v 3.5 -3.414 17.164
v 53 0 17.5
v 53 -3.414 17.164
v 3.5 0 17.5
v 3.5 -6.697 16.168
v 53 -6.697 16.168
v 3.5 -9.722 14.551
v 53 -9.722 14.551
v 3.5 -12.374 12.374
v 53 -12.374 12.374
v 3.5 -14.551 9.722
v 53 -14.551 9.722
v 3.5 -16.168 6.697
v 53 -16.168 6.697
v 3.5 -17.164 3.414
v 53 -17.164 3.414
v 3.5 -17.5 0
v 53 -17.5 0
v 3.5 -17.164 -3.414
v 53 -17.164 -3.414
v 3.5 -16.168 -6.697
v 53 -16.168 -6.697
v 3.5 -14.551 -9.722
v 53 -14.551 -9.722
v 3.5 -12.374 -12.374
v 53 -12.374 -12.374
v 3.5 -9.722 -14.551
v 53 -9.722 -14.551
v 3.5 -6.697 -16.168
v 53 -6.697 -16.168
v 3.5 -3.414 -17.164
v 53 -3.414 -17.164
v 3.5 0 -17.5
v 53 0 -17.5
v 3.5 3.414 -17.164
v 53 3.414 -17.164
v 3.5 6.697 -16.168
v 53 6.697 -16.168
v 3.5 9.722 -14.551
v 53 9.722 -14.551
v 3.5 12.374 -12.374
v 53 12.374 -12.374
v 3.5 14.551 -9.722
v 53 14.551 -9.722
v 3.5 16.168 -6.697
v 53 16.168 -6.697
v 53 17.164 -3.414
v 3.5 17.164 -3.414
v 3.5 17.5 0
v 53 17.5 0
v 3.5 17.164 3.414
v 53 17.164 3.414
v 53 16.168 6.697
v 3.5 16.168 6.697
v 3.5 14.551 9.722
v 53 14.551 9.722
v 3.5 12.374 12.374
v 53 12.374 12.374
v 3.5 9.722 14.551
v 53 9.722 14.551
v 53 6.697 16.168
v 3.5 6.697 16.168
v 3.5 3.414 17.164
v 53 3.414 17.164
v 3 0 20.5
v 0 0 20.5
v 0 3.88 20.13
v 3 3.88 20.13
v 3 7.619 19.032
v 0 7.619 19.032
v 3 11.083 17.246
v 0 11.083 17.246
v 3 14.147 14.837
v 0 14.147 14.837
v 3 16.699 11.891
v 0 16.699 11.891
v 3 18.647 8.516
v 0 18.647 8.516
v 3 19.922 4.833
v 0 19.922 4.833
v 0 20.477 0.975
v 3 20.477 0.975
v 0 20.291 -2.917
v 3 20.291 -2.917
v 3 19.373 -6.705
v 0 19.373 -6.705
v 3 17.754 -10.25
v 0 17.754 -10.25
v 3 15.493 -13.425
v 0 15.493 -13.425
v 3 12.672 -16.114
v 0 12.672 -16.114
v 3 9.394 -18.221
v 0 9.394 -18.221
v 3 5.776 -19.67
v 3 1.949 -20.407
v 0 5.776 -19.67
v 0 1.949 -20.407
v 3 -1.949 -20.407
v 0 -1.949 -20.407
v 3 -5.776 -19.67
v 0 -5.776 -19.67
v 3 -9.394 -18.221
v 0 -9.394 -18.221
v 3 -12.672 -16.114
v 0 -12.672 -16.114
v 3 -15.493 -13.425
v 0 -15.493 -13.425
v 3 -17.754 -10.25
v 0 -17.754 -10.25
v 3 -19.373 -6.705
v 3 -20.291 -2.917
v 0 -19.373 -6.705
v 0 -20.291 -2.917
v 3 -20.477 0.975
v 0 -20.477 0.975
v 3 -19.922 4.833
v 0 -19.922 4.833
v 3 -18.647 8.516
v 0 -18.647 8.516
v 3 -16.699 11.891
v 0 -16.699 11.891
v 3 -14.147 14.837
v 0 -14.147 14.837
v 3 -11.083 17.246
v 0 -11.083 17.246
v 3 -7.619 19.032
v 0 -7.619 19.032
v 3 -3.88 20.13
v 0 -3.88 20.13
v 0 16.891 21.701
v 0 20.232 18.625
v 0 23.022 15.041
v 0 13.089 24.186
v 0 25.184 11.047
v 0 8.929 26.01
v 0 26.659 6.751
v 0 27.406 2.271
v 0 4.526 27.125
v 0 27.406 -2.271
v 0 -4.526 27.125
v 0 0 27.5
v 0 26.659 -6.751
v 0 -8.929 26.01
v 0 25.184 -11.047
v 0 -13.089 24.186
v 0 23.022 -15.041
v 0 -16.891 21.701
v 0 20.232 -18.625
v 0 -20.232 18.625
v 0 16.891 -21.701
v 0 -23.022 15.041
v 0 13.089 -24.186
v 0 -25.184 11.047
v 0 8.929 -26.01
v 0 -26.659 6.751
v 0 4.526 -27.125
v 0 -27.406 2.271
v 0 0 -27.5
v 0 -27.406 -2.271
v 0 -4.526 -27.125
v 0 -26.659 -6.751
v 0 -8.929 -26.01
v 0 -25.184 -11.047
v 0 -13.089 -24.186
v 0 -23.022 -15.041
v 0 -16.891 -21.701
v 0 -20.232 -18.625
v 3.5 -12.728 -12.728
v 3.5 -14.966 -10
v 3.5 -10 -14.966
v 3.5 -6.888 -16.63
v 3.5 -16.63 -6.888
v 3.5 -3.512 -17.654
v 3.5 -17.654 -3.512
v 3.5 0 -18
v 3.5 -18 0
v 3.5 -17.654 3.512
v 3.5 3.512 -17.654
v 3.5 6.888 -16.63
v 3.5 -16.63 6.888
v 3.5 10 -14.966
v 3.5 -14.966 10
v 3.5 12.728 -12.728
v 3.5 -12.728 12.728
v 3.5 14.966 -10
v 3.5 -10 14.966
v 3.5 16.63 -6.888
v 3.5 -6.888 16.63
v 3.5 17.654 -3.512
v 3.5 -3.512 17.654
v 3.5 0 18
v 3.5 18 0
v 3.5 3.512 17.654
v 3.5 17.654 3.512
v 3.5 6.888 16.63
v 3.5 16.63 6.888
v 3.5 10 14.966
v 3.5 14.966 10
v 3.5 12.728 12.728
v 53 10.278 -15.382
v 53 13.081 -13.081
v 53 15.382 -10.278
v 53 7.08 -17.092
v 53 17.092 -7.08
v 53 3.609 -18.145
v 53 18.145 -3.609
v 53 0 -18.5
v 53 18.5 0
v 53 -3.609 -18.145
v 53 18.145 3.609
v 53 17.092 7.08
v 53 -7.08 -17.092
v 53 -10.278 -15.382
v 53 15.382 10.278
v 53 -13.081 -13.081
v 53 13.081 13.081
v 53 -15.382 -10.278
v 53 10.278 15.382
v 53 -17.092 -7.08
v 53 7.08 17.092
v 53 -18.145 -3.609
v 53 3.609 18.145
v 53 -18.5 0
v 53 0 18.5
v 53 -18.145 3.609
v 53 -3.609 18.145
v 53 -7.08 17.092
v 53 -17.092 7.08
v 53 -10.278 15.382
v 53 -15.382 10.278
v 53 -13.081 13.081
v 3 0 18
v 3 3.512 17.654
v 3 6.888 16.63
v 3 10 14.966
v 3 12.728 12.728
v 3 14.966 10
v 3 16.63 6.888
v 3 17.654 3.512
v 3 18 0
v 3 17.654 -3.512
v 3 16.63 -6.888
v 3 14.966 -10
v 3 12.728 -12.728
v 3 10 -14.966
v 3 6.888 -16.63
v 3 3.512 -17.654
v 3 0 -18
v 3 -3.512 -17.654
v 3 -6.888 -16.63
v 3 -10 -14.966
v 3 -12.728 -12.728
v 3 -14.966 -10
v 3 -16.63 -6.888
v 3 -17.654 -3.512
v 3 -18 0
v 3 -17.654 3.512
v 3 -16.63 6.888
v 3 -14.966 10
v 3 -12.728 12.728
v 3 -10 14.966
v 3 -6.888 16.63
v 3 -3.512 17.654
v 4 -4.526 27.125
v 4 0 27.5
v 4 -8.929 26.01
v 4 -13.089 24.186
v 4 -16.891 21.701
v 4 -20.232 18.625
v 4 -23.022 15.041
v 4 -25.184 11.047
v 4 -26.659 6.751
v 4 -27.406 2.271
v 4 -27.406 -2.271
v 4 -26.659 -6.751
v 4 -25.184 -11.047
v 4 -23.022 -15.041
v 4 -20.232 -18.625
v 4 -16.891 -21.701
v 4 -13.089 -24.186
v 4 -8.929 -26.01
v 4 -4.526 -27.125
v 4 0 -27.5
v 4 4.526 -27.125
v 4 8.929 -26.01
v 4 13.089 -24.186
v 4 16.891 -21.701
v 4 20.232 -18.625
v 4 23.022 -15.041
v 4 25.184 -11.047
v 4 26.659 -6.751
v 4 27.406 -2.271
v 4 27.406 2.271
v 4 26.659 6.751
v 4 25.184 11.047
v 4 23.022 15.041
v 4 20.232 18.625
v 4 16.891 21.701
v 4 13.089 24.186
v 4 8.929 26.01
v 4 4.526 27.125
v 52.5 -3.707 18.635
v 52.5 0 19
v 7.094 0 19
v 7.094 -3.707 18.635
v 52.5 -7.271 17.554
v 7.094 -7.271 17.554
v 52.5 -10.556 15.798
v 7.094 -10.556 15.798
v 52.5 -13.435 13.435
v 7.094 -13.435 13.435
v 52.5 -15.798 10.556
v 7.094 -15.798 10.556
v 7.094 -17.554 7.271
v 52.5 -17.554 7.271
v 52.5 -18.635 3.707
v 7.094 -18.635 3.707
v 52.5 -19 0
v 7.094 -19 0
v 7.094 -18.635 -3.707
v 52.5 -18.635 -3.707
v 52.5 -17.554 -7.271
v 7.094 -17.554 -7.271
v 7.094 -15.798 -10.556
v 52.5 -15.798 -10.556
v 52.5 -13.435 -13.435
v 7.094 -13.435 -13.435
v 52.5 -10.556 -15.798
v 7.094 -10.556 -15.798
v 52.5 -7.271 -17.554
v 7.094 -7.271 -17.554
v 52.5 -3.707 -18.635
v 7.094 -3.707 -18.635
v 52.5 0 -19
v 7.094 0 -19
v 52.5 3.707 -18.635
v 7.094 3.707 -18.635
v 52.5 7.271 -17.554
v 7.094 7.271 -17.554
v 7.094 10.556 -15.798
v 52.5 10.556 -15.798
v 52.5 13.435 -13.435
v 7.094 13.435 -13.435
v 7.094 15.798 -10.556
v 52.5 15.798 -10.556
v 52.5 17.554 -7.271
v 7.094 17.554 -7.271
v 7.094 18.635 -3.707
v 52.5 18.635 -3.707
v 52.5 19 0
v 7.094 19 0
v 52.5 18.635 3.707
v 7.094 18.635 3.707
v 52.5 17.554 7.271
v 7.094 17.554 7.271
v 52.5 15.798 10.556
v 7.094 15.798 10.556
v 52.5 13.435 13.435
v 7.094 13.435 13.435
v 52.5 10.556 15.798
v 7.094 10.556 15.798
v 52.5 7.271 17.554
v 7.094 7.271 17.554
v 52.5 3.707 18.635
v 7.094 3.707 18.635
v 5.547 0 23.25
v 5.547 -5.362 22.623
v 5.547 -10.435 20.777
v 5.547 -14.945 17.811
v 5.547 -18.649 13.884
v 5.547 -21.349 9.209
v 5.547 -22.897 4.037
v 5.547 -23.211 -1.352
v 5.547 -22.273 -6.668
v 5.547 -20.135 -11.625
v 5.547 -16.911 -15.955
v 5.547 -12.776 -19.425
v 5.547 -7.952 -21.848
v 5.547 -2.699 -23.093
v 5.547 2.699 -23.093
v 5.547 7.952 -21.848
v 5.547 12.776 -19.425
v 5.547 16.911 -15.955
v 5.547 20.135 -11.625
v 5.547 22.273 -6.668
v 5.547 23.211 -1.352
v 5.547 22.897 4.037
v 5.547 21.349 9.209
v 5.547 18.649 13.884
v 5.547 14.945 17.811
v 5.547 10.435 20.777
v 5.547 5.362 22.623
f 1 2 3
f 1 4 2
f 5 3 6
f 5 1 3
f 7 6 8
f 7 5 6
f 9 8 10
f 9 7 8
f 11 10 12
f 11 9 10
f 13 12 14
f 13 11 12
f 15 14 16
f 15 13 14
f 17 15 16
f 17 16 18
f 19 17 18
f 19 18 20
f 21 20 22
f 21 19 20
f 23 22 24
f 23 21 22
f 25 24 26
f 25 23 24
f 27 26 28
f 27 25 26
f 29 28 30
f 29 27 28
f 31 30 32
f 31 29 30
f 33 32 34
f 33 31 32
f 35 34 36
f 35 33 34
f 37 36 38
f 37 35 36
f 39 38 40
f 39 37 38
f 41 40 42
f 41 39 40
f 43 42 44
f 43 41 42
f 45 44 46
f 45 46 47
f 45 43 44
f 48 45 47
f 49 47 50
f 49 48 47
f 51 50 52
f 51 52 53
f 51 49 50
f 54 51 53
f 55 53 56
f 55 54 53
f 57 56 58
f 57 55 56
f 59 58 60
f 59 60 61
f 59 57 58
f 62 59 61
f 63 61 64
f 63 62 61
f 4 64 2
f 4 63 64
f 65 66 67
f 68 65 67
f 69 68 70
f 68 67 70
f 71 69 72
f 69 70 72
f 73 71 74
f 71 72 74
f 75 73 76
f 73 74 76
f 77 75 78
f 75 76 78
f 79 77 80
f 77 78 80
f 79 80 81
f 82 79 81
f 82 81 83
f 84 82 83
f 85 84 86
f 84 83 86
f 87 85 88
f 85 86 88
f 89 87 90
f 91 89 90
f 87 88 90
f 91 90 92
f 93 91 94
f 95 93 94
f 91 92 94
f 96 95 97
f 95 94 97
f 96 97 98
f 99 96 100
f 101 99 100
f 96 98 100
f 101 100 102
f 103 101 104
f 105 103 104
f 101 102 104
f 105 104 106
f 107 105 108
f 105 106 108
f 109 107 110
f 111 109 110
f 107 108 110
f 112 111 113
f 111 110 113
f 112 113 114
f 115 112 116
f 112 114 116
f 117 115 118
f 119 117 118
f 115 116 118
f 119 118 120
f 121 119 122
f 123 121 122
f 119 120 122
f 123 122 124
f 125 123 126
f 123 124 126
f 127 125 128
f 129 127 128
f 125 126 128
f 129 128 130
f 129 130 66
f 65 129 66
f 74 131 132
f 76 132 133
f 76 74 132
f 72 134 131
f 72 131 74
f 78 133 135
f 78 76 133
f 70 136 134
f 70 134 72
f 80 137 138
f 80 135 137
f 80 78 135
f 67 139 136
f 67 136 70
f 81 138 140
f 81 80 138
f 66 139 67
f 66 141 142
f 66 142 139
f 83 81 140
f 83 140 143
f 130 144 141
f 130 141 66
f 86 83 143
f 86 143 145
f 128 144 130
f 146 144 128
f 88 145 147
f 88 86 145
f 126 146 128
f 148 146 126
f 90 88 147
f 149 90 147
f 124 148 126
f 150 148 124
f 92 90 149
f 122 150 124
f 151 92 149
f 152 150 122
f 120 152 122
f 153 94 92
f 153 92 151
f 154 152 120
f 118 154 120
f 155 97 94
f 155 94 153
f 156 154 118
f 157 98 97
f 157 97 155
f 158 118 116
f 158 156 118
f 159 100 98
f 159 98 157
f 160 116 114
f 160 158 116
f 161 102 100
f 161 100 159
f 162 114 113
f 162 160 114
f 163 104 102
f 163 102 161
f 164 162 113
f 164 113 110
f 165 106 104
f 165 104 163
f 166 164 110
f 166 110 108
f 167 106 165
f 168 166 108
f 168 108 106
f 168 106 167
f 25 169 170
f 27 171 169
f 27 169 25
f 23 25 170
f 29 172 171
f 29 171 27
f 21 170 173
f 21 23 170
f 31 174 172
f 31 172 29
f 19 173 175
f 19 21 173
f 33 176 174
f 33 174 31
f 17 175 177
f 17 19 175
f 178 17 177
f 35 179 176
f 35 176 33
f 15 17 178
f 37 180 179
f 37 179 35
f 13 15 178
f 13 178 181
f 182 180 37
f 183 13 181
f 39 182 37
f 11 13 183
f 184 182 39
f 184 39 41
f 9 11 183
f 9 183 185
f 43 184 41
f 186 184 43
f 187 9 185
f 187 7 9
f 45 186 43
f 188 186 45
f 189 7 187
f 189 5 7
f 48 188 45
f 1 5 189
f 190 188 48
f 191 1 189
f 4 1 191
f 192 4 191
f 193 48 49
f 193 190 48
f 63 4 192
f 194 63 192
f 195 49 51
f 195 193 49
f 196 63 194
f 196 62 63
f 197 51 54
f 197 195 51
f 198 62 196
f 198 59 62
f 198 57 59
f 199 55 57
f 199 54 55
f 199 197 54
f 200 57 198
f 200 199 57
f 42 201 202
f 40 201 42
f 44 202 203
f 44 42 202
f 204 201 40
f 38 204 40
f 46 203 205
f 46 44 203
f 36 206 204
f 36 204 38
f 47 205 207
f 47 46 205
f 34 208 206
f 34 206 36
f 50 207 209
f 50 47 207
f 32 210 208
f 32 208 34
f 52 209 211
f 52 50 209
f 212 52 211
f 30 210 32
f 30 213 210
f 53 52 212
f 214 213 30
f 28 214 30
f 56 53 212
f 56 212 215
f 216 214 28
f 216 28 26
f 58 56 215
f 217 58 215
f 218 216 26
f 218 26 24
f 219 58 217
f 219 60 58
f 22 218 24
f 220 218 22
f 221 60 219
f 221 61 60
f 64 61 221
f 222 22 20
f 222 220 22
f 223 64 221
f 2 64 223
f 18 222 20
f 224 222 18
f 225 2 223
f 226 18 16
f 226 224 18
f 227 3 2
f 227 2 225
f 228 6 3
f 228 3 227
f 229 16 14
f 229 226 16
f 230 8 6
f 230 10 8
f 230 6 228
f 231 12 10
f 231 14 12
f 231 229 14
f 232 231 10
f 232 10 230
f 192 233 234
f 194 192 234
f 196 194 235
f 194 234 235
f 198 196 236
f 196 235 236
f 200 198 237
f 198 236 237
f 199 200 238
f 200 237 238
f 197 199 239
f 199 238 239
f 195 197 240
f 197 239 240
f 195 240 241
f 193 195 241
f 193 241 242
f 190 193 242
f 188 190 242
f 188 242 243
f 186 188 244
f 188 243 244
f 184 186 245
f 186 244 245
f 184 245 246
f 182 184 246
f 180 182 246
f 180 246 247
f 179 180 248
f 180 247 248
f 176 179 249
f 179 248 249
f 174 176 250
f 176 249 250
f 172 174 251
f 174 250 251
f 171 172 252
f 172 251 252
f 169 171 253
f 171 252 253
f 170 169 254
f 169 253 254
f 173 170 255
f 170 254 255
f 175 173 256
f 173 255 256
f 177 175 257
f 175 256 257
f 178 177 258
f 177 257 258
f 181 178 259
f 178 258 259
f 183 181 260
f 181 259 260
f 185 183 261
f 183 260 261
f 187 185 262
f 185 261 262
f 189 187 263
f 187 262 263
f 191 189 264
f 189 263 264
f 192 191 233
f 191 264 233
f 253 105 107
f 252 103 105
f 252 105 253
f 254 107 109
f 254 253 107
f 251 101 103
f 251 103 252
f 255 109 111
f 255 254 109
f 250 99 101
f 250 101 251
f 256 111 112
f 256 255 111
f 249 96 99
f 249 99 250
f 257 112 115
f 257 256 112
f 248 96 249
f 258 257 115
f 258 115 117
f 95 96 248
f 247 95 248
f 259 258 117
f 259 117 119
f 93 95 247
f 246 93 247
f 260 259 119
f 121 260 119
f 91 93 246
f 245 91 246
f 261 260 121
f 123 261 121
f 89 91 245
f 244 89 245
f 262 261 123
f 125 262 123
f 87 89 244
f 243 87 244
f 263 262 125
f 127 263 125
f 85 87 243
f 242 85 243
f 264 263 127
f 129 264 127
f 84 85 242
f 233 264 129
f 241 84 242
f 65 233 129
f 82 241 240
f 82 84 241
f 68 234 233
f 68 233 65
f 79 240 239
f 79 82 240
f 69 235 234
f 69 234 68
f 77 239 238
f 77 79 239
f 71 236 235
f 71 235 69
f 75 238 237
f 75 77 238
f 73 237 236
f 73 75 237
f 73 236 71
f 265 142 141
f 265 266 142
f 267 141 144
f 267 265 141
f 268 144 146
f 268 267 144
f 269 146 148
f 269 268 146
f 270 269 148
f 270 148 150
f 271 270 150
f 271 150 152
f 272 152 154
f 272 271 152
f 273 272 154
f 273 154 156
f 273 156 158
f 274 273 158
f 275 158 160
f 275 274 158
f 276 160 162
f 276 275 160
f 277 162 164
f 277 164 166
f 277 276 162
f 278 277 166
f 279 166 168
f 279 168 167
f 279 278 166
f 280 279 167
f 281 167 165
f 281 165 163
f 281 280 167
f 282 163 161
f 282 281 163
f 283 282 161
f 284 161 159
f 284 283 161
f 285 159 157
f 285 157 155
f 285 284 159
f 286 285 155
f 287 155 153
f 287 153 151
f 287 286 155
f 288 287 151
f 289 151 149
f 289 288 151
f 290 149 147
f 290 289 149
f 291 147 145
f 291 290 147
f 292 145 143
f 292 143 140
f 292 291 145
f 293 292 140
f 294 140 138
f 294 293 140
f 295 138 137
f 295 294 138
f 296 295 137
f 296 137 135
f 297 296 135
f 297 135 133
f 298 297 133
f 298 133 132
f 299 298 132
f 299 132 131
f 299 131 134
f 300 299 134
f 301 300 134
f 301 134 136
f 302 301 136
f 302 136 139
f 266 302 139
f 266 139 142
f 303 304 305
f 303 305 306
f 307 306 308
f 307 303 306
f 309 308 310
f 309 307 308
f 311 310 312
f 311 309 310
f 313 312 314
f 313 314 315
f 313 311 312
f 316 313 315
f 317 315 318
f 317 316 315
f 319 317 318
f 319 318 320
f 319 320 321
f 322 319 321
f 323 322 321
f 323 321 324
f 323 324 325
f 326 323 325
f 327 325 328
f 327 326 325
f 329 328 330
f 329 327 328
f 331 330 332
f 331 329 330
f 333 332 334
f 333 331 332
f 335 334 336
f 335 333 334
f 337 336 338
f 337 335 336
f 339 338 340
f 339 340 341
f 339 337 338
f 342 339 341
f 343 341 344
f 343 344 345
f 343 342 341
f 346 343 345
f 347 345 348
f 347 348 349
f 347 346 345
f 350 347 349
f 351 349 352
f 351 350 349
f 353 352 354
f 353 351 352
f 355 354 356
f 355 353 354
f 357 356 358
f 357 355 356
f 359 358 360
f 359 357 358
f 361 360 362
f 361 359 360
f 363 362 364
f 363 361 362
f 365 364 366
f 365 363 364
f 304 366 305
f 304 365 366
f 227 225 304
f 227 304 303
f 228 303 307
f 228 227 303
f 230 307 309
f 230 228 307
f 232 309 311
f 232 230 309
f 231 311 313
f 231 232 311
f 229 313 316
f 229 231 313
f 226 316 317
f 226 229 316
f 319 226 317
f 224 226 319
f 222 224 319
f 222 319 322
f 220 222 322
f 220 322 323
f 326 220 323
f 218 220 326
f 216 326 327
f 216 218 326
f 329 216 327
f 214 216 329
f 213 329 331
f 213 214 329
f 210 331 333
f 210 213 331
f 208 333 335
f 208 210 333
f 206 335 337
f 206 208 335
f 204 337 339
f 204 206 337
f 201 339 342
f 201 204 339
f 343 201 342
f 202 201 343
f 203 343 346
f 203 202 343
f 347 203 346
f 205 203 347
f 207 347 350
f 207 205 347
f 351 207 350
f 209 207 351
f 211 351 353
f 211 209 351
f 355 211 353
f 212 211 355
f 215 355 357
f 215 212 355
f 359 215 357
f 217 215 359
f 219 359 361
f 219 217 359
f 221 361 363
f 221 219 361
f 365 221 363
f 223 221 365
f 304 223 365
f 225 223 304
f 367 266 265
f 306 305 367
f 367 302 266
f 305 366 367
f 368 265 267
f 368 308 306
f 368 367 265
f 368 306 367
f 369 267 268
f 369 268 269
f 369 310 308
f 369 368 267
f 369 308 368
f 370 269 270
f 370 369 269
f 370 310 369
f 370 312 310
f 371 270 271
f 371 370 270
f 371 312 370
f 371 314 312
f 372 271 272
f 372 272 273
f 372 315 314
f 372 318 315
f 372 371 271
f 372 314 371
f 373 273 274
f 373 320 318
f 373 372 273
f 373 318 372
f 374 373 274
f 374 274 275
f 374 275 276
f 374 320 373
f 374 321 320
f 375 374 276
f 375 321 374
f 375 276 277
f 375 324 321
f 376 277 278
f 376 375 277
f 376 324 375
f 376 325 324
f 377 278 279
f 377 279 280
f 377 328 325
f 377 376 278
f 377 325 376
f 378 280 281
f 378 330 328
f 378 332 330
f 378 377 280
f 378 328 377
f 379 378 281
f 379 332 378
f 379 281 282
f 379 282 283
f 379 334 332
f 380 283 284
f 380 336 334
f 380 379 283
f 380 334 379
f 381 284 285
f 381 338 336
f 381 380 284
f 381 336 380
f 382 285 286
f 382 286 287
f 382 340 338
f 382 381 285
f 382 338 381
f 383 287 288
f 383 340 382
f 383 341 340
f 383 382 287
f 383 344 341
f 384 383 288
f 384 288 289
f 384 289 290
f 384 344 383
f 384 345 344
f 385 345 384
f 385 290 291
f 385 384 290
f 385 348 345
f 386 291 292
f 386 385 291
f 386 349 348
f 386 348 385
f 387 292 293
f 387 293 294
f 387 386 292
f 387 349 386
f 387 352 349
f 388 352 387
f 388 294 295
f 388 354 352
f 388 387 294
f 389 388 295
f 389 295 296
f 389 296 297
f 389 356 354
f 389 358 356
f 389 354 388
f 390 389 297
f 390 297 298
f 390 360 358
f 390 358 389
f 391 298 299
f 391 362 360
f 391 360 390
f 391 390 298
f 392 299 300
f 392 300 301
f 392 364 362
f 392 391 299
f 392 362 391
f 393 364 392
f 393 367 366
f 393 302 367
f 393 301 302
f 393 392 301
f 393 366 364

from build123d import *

# Parameters (mm, degrees)
SKETCH_2_R          = 20.5
CUT_EXTRUDE_1_DEPTH = 3
SKETCH_3_R          = 18
CUT_EXTRUDE_2_DEPTH = 0.5
CHAMFER_1_SIZE      = 0.5


with BuildPart() as part:
    # 스케치1 → 회전1 (revolve)
    with BuildSketch(Plane.XY, mode=Mode.PRIVATE) as revolve_1_sk:
        Polygon((0, 17.5), (0, 27.5), (4, 27.5), (7.093746991, 19), (53, 19), (53, 17.5), align=None)
    revolve(revolve_1_sk.sketch.rotate(Axis((0, 0, 0), (1, 0, 0)), 90), axis=Axis((0, 0, 0), (1, 0, 0)))

    # 스케치2 → 컷-돌출1 (cut)
    with BuildSketch(Plane.ZY):
        Circle(SKETCH_2_R)
    extrude(amount=-CUT_EXTRUDE_1_DEPTH, mode=Mode.SUBTRACT)

    # 스케치3 → 컷-돌출2 (cut)
    with BuildSketch(Plane.ZY.offset(-3)):
        Circle(SKETCH_3_R)
    extrude(amount=-CUT_EXTRUDE_2_DEPTH, mode=Mode.SUBTRACT)

    # 모따기1
    chamfer_1_edges = [part.edges().sort_by_distance(p)[0] for p in [
        (53, 0, -19),
    ]]
    chamfer(chamfer_1_edges, length=CHAMFER_1_SIZE)


solid = part.part
